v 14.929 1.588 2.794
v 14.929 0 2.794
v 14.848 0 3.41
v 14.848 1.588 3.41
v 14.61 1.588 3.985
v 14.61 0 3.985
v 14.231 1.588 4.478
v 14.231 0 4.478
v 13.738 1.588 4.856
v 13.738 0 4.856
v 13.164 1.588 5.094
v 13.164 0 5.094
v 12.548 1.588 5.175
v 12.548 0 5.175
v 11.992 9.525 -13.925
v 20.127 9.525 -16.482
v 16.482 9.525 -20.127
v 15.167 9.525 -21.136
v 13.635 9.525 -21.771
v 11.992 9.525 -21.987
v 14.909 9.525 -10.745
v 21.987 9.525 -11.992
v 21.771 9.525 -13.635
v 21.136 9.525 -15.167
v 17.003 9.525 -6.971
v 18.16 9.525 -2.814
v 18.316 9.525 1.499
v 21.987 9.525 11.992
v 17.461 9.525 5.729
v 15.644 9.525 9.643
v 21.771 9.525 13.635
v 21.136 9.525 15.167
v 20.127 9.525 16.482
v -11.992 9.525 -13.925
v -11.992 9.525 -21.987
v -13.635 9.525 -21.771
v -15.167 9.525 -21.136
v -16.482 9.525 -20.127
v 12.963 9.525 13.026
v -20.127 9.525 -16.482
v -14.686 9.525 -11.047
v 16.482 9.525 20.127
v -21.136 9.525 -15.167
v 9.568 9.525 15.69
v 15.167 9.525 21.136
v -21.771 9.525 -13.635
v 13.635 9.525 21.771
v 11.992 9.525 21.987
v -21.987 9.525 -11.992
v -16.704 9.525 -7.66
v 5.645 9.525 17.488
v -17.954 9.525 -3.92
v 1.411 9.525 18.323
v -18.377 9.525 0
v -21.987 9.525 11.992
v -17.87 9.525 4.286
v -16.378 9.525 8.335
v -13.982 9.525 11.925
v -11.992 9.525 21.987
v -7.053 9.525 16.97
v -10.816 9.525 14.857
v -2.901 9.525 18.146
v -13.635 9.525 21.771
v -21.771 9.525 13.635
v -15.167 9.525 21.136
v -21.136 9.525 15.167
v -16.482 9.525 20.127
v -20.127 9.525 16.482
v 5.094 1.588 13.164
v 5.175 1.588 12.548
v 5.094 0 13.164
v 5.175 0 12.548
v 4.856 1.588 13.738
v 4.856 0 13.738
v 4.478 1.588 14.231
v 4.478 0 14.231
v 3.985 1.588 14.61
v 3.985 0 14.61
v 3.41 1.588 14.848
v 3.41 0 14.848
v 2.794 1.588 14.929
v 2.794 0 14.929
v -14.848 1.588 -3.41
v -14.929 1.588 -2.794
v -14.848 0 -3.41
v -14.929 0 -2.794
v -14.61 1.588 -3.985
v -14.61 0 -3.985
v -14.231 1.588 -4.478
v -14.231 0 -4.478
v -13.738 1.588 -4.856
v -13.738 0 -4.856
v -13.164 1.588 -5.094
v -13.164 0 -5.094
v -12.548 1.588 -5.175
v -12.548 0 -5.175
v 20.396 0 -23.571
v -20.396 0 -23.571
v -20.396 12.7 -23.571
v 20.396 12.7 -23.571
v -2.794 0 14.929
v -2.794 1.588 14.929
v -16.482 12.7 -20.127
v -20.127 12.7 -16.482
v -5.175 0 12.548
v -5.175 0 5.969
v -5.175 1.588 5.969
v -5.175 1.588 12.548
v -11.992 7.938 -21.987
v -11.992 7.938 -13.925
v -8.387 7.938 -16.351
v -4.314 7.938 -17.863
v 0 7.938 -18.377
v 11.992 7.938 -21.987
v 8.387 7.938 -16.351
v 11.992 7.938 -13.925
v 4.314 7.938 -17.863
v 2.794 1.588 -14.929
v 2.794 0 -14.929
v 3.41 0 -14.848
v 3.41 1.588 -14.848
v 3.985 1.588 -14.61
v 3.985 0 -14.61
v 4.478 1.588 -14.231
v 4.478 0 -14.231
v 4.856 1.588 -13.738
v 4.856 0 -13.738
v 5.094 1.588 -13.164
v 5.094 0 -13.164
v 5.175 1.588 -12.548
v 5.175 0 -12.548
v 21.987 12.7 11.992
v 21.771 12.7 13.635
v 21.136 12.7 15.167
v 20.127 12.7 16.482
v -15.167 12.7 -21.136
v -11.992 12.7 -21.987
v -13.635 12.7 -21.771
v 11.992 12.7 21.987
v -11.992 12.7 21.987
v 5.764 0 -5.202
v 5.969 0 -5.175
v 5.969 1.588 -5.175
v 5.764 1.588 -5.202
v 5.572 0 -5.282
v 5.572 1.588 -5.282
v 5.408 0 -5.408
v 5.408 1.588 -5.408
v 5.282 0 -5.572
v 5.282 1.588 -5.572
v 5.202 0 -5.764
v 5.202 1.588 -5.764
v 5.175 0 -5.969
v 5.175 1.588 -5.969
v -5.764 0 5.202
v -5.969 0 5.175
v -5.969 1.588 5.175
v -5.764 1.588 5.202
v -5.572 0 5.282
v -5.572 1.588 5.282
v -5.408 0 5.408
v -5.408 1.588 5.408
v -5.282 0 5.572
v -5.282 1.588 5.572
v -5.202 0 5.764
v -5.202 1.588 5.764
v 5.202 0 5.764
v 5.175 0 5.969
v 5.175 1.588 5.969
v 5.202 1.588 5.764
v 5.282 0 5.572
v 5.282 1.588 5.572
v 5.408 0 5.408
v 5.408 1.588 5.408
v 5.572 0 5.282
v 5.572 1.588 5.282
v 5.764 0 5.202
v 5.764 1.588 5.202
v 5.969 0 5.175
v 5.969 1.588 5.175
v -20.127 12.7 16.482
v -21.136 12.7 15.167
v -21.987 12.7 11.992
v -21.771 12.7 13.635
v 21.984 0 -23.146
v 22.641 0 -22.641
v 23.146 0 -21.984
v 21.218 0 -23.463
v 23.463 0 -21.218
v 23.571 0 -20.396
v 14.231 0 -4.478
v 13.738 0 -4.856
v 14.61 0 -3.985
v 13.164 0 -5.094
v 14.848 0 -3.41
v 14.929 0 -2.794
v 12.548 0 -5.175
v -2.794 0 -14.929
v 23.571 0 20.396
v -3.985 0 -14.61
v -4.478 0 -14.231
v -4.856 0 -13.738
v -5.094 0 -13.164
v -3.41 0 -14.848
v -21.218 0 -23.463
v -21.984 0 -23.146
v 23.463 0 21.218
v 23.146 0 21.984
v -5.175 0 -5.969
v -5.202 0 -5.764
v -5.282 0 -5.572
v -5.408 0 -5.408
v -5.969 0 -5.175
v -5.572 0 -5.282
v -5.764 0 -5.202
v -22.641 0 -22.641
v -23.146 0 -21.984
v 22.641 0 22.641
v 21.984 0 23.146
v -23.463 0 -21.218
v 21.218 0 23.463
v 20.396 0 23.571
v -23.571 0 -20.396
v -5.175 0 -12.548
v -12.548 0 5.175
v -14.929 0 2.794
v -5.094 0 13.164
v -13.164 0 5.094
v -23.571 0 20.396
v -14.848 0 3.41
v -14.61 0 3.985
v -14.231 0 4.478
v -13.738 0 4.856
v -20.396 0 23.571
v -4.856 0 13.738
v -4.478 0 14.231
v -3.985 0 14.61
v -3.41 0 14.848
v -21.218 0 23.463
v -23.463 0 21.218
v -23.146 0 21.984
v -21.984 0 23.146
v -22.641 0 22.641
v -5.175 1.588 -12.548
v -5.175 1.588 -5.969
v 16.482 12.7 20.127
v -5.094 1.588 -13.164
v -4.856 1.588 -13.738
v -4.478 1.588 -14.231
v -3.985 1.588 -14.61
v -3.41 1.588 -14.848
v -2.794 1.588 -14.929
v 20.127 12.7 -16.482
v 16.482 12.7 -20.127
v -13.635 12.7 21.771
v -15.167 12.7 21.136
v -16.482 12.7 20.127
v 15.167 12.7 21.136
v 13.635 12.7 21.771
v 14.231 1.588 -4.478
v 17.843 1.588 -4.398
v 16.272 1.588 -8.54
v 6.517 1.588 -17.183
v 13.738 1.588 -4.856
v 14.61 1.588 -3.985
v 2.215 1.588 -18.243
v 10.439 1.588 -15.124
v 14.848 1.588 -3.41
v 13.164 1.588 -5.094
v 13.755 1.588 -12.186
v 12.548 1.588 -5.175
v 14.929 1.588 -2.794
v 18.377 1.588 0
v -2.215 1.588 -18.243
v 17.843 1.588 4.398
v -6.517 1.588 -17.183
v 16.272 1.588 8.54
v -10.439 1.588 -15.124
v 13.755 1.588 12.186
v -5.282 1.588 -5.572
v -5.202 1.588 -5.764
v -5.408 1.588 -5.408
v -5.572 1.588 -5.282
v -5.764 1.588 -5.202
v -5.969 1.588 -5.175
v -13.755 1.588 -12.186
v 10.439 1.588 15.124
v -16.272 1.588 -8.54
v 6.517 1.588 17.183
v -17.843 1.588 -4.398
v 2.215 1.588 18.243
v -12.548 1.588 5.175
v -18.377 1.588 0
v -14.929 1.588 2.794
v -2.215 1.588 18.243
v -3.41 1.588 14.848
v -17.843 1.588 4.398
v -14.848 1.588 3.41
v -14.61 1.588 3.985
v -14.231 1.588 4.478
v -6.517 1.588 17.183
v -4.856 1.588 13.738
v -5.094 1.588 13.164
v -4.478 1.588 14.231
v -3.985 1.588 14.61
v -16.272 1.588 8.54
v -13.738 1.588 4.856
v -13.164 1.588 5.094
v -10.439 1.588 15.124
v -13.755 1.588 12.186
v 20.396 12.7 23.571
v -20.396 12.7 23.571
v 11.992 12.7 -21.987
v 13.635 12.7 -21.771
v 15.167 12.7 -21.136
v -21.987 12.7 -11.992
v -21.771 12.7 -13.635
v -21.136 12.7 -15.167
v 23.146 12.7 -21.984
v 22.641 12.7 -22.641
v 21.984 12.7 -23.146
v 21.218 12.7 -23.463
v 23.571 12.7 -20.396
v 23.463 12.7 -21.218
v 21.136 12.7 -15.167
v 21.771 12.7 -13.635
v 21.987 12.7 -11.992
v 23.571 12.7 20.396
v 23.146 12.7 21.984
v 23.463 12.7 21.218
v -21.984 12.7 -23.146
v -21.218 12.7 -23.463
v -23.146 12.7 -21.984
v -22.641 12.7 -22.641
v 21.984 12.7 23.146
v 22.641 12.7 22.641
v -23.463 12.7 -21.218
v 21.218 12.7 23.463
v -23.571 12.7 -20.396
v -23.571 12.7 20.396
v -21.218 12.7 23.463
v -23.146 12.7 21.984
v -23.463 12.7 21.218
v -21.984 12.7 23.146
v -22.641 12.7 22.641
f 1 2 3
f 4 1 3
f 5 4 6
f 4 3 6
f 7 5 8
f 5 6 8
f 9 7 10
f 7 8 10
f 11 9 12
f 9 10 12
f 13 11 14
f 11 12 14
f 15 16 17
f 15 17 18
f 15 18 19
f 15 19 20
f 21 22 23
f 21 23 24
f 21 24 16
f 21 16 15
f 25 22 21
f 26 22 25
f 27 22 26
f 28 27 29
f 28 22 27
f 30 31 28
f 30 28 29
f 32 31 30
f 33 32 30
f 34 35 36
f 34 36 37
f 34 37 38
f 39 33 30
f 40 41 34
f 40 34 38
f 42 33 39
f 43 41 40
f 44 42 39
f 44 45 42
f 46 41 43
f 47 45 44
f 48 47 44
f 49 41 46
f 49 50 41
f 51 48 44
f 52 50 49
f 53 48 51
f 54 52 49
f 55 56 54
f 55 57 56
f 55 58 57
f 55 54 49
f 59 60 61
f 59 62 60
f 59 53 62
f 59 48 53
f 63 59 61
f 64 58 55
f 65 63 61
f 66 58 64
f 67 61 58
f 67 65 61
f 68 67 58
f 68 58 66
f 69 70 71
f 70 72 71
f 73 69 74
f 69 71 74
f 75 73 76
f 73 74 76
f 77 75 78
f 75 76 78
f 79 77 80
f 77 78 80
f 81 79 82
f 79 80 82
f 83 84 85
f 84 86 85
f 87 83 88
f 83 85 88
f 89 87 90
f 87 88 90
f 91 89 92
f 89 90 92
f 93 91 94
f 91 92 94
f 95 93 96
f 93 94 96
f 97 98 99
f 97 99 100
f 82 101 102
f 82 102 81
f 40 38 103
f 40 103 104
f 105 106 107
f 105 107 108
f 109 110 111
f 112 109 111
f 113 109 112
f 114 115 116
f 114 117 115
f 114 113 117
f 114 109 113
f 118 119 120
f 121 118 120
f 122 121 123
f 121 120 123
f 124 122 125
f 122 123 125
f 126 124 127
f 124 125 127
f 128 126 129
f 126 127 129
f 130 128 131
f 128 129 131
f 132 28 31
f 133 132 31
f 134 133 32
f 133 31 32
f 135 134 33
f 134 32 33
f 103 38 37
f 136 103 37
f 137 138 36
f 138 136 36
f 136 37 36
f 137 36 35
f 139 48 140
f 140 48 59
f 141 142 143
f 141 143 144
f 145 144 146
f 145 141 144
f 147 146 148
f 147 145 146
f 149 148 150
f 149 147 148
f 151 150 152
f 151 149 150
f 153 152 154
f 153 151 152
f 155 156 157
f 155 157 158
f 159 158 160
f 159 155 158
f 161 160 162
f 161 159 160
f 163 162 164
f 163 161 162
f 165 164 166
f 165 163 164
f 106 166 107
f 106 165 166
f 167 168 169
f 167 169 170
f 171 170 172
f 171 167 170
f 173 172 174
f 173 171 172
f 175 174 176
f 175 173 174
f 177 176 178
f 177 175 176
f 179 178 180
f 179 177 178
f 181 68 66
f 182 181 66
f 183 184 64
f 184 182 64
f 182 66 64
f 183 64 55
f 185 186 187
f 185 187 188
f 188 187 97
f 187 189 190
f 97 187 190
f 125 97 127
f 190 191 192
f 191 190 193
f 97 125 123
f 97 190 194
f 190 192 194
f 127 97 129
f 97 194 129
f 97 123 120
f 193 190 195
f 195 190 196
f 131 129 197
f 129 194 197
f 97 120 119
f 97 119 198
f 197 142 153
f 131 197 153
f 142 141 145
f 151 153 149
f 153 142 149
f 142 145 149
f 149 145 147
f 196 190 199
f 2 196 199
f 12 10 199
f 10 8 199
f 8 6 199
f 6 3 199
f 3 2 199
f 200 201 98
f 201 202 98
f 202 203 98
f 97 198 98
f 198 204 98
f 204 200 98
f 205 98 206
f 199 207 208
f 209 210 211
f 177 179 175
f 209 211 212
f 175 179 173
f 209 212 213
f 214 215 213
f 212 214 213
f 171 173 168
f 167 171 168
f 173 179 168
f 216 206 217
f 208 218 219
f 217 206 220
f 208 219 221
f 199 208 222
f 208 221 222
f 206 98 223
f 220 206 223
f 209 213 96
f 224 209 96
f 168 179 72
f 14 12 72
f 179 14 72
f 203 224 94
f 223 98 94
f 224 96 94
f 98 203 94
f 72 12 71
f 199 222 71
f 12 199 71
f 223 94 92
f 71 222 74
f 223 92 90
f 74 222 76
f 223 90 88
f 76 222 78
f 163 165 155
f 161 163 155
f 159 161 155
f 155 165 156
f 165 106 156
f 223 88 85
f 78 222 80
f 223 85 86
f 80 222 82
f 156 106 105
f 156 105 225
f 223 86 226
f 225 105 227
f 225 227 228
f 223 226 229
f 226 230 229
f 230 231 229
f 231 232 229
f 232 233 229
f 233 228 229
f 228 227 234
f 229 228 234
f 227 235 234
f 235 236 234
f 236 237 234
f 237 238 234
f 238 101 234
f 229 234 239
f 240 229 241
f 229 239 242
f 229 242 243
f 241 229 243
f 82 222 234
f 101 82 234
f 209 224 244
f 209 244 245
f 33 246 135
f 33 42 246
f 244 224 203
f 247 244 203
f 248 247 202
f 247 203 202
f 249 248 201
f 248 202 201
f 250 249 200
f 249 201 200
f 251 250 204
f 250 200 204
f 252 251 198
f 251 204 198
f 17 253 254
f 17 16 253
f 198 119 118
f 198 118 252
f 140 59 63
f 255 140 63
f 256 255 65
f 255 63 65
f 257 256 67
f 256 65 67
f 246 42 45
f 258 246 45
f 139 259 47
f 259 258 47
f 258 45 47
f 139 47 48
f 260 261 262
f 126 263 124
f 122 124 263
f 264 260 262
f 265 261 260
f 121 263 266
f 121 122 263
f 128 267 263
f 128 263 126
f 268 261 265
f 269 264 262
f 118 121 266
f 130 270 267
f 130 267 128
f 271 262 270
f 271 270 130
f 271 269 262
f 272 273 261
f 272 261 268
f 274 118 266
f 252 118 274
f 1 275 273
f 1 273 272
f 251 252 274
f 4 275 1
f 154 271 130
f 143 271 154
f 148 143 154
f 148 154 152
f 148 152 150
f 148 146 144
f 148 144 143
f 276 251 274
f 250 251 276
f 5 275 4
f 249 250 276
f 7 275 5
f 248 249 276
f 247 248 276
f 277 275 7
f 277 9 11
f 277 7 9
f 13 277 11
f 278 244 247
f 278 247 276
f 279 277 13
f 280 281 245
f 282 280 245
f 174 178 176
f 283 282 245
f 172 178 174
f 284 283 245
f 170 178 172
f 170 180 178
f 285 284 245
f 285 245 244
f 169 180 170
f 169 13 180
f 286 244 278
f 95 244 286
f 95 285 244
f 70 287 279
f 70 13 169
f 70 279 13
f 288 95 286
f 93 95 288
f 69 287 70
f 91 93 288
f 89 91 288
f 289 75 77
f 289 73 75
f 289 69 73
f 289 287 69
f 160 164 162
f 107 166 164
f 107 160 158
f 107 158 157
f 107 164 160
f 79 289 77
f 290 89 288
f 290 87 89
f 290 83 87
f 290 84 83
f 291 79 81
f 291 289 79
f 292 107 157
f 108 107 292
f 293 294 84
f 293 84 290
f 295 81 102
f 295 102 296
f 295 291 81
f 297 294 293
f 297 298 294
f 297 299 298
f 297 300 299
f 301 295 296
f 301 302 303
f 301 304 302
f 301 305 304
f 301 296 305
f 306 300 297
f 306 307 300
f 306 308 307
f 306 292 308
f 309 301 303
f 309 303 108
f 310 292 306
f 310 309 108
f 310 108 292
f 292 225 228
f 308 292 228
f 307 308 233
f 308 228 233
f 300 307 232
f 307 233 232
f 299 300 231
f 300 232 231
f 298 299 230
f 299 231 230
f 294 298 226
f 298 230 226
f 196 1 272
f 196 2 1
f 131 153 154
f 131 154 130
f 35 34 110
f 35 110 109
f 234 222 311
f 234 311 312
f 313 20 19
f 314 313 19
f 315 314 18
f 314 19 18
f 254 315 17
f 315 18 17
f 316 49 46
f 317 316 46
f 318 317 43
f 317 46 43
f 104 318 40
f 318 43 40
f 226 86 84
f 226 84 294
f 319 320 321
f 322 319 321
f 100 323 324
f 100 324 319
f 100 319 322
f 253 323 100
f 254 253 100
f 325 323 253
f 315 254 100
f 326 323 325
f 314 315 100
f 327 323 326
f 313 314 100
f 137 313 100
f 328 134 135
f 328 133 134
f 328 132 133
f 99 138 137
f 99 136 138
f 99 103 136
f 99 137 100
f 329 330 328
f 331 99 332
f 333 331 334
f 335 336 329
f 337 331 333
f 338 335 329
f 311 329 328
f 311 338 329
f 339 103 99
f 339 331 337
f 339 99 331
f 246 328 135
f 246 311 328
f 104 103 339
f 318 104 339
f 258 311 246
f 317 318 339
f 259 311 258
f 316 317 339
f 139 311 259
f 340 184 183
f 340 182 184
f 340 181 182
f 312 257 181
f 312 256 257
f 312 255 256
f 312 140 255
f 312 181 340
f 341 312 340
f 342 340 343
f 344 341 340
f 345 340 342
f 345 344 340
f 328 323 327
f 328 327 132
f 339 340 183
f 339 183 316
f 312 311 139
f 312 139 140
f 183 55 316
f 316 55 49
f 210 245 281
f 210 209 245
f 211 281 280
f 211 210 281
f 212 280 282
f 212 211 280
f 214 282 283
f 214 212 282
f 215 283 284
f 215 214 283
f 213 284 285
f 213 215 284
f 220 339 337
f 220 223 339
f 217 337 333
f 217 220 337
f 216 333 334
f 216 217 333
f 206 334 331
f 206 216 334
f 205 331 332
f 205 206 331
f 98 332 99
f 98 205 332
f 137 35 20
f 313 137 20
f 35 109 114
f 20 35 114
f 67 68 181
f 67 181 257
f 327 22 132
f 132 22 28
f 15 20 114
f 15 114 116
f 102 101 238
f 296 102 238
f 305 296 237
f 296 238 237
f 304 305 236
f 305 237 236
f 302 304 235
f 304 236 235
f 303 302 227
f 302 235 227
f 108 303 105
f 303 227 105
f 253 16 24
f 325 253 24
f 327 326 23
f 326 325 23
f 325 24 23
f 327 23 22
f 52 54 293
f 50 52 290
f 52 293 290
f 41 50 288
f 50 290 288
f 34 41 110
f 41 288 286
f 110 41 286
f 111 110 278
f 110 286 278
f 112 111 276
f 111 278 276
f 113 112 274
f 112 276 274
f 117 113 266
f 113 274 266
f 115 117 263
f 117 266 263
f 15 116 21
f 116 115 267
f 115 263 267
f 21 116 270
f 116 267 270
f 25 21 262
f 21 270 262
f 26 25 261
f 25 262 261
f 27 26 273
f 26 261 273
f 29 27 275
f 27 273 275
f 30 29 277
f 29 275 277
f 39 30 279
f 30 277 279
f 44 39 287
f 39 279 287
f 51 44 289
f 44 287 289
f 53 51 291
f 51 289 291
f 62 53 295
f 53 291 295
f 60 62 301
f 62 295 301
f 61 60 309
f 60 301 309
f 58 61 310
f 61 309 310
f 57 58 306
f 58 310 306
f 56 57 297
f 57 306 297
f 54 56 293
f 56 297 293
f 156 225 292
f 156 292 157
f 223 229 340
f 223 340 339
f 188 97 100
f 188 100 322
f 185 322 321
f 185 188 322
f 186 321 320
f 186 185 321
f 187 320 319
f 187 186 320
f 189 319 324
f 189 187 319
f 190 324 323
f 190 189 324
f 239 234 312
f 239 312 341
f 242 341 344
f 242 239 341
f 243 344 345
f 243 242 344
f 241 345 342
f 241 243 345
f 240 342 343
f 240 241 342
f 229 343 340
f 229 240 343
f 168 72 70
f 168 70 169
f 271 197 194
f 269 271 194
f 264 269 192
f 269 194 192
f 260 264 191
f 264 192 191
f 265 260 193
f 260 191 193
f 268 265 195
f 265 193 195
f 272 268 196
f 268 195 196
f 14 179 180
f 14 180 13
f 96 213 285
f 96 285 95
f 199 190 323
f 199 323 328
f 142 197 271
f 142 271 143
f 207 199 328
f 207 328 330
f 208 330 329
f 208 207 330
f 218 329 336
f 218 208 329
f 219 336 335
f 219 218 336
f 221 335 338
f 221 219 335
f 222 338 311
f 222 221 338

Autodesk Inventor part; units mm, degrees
ref_plane "YZ Plane" through (0, 0, 0) normal (1, 0, 0) x (0, 1, 0)
ref_plane "XZ Plane" through (0, 0, 0) normal (0, 1, 0) x (-1, 0, 0)
ref_plane "XY Plane" through (0, 0, 0) normal (0, 0, 1) x (1, 0, 0)
sketch "Sketch1" plane through (0, 0, 0) normal (0, 1, 0) x (-1, 0, 0)
  circle A0 centre (0, 0) radius 18.3769
  line L0 (18.3769, 18.3769) -> (-18.3769, -18.3769) construction
  line L1 (-18.3769, 18.3769) -> (18.3769, -18.3769) construction
  line L2 (13.335, 21.59) -> (-13.335, 21.59)
  line L3 (-21.59, 13.335) -> (-21.59, -13.335)
  line L4 (-13.335, -21.59) -> (13.335, -21.59)
  line L5 (21.59, -13.335) -> (21.59, 13.335)
  line L6 (21.59, 21.59) -> (-21.59, -21.59) construction
  line L7 (-21.59, 21.59) -> (21.59, -21.59) construction
  line L8 (21.59, 13.335) -> (13.335, 21.59)
  line L9 (-13.335, 21.59) -> (-21.59, 13.335)
  line L10 (-21.59, -13.335) -> (-13.335, -21.59)
  line L11 (13.335, -21.59) -> (21.59, -13.335)
  circle A1 centre (15.24, -15.24) radius 1.0033
  circle A2 centre (-15.24, -15.24) radius 1.0033
  circle A3 centre (-15.24, 15.24) radius 1.0033
  circle A4 centre (15.24, 15.24) radius 1.0033
  line L12 (11.9917, -21.9869) -> (-11.9917, -21.9869)
  line L13 (-21.9869, -11.9917) -> (-21.9869, 11.9917)
  line L14 (-11.9917, 21.9869) -> (11.9917, 21.9869)
  line L15 (21.9869, 11.9917) -> (21.9869, -11.9917)
  line L16 (-20.3962, 23.5712) -> (20.3962, 23.5712)
  line L17 (23.5712, 20.3962) -> (23.5712, -20.3962)
  line L18 (20.3962, -23.5712) -> (-20.3962, -23.5712)
  line L19 (-23.5712, -20.3962) -> (-23.5712, 20.3962)
  line L20 (-23.5712, 23.5712) -> (23.5712, -23.5712) construction
  line L21 (23.5712, 23.5712) -> (-23.5712, -23.5712) construction
  arc A5 (20.3962, -23.5712) -> (23.5712, -20.3962) centre (20.3962, -20.3962) ccw
  arc A6 (-23.5712, -20.3962) -> (-20.3962, -23.5712) centre (-20.3962, -20.3962) ccw
  arc A7 (-20.3962, 23.5712) -> (-23.5712, 20.3962) centre (-20.3962, 20.3962) ccw
  arc A8 (23.5712, 20.3962) -> (20.3962, 23.5712) centre (20.3962, 20.3962) ccw
  circle A9 centre (20.3962, -20.3962) radius 1.0033
  circle A10 centre (-20.3962, -20.3962) radius 1.0033
  circle A11 centre (-20.3962, 20.3962) radius 1.0033
  circle A12 centre (20.3962, 20.3962) radius 1.0033
  line L22 (16.4818, -20.127) -> (20.127, -16.4818)
  line L23 (20.127, 16.4818) -> (16.4818, 20.127)
  line L24 (-16.4818, 20.127) -> (-20.127, 16.4818)
  line L25 (-20.127, -16.4818) -> (-16.4818, -20.127)
  arc A13 (21.9869, 11.9917) -> (20.127, 16.4818) centre (15.6369, 11.9917) ccw
  arc A14 (16.4818, 20.127) -> (11.9917, 21.9869) centre (11.9917, 15.6369) ccw
  arc A15 (-11.9917, 21.9869) -> (-16.4818, 20.127) centre (-11.9917, 15.6369) ccw
  arc A16 (-20.127, 16.4818) -> (-21.9869, 11.9917) centre (-15.6369, 11.9917) ccw
  arc A17 (-21.9869, -11.9917) -> (-20.127, -16.4818) centre (-15.6369, -11.9917) ccw
  arc A18 (-16.4818, -20.127) -> (-11.9917, -21.9869) centre (-11.9917, -15.6369) ccw
  arc A19 (11.9917, -21.9869) -> (16.4818, -20.127) centre (11.9917, -15.6369) ccw
  arc A20 (20.127, -16.4818) -> (21.9869, -11.9917) centre (15.6369, -11.9917) ccw
  line L26 (4.3815, -5.969) -> (4.3815, -12.5476)
  line L27 (2.794, -14.1351) -> (-2.794, -14.1351)
  line L28 (-4.3815, -12.5476) -> (-4.3815, -5.969)
  line L29 (4.3815, 5.969) -> (4.3815, 12.5476)
  line L30 (2.794, 14.1351) -> (-2.794, 14.1351)
  line L31 (-4.3815, 12.5476) -> (-4.3815, 5.969)
  line L32 (-5.969, -4.3815) -> (-12.5476, -4.3815)
  line L33 (-14.1351, -2.794) -> (-14.1351, 2.794)
  line L34 (-12.5476, 4.3815) -> (-5.969, 4.3815)
  line L35 (5.969, -4.3815) -> (12.5476, -4.3815)
  line L36 (14.1351, -2.794) -> (14.1351, 2.794)
  line L37 (12.5476, 4.3815) -> (5.969, 4.3815)
  arc A21 (2.794, -14.1351) -> (4.3815, -12.5476) centre (2.794, -12.5476) ccw
  arc A22 (-4.3815, -12.5476) -> (-2.794, -14.1351) centre (-2.794, -12.5476) ccw
  arc A23 (-4.3815, -5.969) -> (-5.969, -4.3815) centre (-5.969, -5.969) ccw
  arc A24 (-14.1351, -2.794) -> (-12.5476, -4.3815) centre (-12.5476, -2.794) ccw
  arc A25 (-14.1351, -2.794) -> (-12.5476, -4.3815) centre (-12.5476, -2.794) ccw
  arc A26 (-12.5476, 4.3815) -> (-14.1351, 2.794) centre (-12.5476, 2.794) ccw
  arc A27 (-5.969, 4.3815) -> (-4.3815, 5.969) centre (-5.969, 5.969) ccw
  arc A28 (-2.794, 14.1351) -> (-4.3815, 12.5476) centre (-2.794, 12.5476) ccw
  arc A29 (4.3815, 12.5476) -> (2.794, 14.1351) centre (2.794, 12.5476) ccw
  arc A30 (4.3815, 5.969) -> (5.969, 4.3815) centre (5.969, 5.969) ccw
  arc A31 (14.1351, 2.794) -> (12.5476, 4.3815) centre (12.5476, 2.794) ccw
  arc A32 (12.5476, -4.3815) -> (14.1351, -2.794) centre (12.5476, -2.794) ccw
  arc A33 (5.969, -4.3815) -> (4.3815, -5.969) centre (5.969, -5.969) ccw
  line L38 (-2.794, -14.9289) -> (2.794, -14.9289)
  arc A34 (2.794, -14.9289) -> (5.1753, -12.5476) centre (2.794, -12.5476) ccw
  line L39 (5.1753, -12.5476) -> (5.1753, -5.969)
  arc A35 (5.969, -5.1753) -> (5.1753, -5.969) centre (5.969, -5.969) ccw
  line L40 (5.969, -5.1753) -> (12.5476, -5.1753)
  arc A36 (12.5476, -5.1753) -> (14.9289, -2.794) centre (12.5476, -2.794) ccw
  line L41 (14.9289, -2.794) -> (14.9289, 2.794)
  arc A37 (14.9289, 2.794) -> (12.5476, 5.1753) centre (12.5476, 2.794) ccw
  line L42 (12.5476, 5.1753) -> (5.969, 5.1753)
  arc A38 (5.1753, 5.969) -> (5.969, 5.1753) centre (5.969, 5.969) ccw
  line L43 (5.1753, 5.969) -> (5.1753, 12.5476)
  arc A39 (5.1753, 12.5476) -> (2.794, 14.9289) centre (2.794, 12.5476) ccw
  line L44 (2.794, 14.9289) -> (-2.794, 14.9289)
  arc A40 (-2.794, 14.9289) -> (-5.1753, 12.5476) centre (-2.794, 12.5476) ccw
  line L45 (-5.1753, 12.5476) -> (-5.1753, 5.969)
  arc A41 (-5.969, 5.1753) -> (-5.1753, 5.969) centre (-5.969, 5.969) ccw
  line L46 (-5.969, 5.1753) -> (-12.5476, 5.1753)
  arc A42 (-12.5476, 5.1753) -> (-14.9289, 2.794) centre (-12.5476, 2.794) ccw
  line L47 (-14.9289, 2.794) -> (-14.9289, -2.794)
  arc A43 (-14.9289, -2.794) -> (-12.5476, -5.1753) centre (-12.5476, -2.794) ccw
  line L48 (-12.5476, -5.1753) -> (-5.969, -5.1753)
  arc A44 (-5.1753, -5.969) -> (-5.969, -5.1753) centre (-5.969, -5.969) ccw
  line L49 (-5.1753, -5.969) -> (-5.1753, -12.5476)
  arc A45 (-5.1753, -12.5476) -> (-2.794, -14.9289) centre (-2.794, -12.5476) ccw
  line L50 (11.9917, -21.59) -> (-11.9917, -21.59)
  line L51 (-11.9917, -21.59) -> (-11.9917, -13.9252)
  line L52 (11.9917, -13.9252) -> (11.9917, -21.59)
  point P0 (4.3815, -14.1351)
  point P1 (-4.3815, -14.1351)
  point P2 (4.3815, 14.1351)
  point P3 (-14.1351, 4.3815)
  point P4 (-4.3815, 4.3815)
  point P5 (14.1351, 4.3815)
  point P6 (4.3815, 4.3815)
  dimension "d33" = 36.7538
  dimension "d34" = 43.18
  dimension "d35" = 43.18
  dimension "d48" = 2.0066
  dimension "d49" = 2.0066
  dimension "d50" = 2.0066
  dimension "d51" = 2.0066
  dimension "d52" = 0.3969
  dimension "d53" = 47.1424
  dimension "d54" = 47.1424
  dimension "d55" = 3.175
  dimension "d56" = 2.0066
  dimension "d57" = 2.0066
  dimension "d58" = 2.0066
  dimension "d59" = 2.0066
  dimension "d62" = 6.35
  dimension "d79" = 8.763
  dimension "d84" = 1.5875
  dimension "d85" = 0.7937
  dimension "d86" = 9.7536
extrude "outer" add sketch "Sketch1" along normal blind 12.7 contours L16 A8 L17 A5 L18 A6 L19 A7
extrude "pcb support" add sketch "Sketch1" along normal blind 9.525 contours A0 L51 L4 L10 L3 L9 L2 L8 L5 L11 L52 | A0 L52 L4 L51 | L12 A18 L25 A17 L13 A16 L24 A15 L14 A14 L23 A13 L15 A20 L22 A19
extrude "pcb screw hole location" add sketch "Sketch1" along normal blind 9.525 contours A1 | A2 | A3 | A4
extrude "back cover screw hole location" add sketch "Sketch1" along normal blind 12.7 contours A9 | A10 | A11 | A12
extrude "dpad face" add sketch "Sketch1" along normal blind 1.5875 contours A0
sketch "Sketch3" plane through (20.3962, 0, -23.5712) normal (0, 0, -1) x (-1, 0, 0)
  line L0 (0, 0) -> (40.7924, 0) projected
  line L1 (-3.175, 0) -> (-3.175, 12.7) projected
  line L2 (32.3879, 9.525) -> (8.4045, 9.525) projected
  line L3 (8.4045, 9.525) -> (32.3879, 9.525) projected
  circle A0 centre (20.3962, 9.525) radius 3.9687
  point P0 (20.3962, 0)
  dimension "d92" = 7.9375
extrude "ether cable" [suppressed]
sketch "Sketch4" plane through (0, 9.525, 0) normal (0, 1, 0) x (1, 0, 0)
  circle A0 centre (0, 0) radius 18.3769 projected
  line L0 (11.9917, 21.9869) -> (-11.9917, 21.9869) projected
  line L1 (-11.9917, 21.9869) -> (11.9917, 21.9869)
  line L2 (11.9917, 21.9869) -> (11.9917, 13.9252)
  line L3 (-11.9917, 13.9252) -> (-11.9917, 21.9869)
  arc A1 (11.9917, 13.9252) -> (-11.9917, 13.9252) centre (0, 0) ccw
extrude "pocket" cut sketch "Sketch4" against normal blind 1.5875 contours A0 L3 L0 L2
properties part number "SnakeControllerCase_v3"
